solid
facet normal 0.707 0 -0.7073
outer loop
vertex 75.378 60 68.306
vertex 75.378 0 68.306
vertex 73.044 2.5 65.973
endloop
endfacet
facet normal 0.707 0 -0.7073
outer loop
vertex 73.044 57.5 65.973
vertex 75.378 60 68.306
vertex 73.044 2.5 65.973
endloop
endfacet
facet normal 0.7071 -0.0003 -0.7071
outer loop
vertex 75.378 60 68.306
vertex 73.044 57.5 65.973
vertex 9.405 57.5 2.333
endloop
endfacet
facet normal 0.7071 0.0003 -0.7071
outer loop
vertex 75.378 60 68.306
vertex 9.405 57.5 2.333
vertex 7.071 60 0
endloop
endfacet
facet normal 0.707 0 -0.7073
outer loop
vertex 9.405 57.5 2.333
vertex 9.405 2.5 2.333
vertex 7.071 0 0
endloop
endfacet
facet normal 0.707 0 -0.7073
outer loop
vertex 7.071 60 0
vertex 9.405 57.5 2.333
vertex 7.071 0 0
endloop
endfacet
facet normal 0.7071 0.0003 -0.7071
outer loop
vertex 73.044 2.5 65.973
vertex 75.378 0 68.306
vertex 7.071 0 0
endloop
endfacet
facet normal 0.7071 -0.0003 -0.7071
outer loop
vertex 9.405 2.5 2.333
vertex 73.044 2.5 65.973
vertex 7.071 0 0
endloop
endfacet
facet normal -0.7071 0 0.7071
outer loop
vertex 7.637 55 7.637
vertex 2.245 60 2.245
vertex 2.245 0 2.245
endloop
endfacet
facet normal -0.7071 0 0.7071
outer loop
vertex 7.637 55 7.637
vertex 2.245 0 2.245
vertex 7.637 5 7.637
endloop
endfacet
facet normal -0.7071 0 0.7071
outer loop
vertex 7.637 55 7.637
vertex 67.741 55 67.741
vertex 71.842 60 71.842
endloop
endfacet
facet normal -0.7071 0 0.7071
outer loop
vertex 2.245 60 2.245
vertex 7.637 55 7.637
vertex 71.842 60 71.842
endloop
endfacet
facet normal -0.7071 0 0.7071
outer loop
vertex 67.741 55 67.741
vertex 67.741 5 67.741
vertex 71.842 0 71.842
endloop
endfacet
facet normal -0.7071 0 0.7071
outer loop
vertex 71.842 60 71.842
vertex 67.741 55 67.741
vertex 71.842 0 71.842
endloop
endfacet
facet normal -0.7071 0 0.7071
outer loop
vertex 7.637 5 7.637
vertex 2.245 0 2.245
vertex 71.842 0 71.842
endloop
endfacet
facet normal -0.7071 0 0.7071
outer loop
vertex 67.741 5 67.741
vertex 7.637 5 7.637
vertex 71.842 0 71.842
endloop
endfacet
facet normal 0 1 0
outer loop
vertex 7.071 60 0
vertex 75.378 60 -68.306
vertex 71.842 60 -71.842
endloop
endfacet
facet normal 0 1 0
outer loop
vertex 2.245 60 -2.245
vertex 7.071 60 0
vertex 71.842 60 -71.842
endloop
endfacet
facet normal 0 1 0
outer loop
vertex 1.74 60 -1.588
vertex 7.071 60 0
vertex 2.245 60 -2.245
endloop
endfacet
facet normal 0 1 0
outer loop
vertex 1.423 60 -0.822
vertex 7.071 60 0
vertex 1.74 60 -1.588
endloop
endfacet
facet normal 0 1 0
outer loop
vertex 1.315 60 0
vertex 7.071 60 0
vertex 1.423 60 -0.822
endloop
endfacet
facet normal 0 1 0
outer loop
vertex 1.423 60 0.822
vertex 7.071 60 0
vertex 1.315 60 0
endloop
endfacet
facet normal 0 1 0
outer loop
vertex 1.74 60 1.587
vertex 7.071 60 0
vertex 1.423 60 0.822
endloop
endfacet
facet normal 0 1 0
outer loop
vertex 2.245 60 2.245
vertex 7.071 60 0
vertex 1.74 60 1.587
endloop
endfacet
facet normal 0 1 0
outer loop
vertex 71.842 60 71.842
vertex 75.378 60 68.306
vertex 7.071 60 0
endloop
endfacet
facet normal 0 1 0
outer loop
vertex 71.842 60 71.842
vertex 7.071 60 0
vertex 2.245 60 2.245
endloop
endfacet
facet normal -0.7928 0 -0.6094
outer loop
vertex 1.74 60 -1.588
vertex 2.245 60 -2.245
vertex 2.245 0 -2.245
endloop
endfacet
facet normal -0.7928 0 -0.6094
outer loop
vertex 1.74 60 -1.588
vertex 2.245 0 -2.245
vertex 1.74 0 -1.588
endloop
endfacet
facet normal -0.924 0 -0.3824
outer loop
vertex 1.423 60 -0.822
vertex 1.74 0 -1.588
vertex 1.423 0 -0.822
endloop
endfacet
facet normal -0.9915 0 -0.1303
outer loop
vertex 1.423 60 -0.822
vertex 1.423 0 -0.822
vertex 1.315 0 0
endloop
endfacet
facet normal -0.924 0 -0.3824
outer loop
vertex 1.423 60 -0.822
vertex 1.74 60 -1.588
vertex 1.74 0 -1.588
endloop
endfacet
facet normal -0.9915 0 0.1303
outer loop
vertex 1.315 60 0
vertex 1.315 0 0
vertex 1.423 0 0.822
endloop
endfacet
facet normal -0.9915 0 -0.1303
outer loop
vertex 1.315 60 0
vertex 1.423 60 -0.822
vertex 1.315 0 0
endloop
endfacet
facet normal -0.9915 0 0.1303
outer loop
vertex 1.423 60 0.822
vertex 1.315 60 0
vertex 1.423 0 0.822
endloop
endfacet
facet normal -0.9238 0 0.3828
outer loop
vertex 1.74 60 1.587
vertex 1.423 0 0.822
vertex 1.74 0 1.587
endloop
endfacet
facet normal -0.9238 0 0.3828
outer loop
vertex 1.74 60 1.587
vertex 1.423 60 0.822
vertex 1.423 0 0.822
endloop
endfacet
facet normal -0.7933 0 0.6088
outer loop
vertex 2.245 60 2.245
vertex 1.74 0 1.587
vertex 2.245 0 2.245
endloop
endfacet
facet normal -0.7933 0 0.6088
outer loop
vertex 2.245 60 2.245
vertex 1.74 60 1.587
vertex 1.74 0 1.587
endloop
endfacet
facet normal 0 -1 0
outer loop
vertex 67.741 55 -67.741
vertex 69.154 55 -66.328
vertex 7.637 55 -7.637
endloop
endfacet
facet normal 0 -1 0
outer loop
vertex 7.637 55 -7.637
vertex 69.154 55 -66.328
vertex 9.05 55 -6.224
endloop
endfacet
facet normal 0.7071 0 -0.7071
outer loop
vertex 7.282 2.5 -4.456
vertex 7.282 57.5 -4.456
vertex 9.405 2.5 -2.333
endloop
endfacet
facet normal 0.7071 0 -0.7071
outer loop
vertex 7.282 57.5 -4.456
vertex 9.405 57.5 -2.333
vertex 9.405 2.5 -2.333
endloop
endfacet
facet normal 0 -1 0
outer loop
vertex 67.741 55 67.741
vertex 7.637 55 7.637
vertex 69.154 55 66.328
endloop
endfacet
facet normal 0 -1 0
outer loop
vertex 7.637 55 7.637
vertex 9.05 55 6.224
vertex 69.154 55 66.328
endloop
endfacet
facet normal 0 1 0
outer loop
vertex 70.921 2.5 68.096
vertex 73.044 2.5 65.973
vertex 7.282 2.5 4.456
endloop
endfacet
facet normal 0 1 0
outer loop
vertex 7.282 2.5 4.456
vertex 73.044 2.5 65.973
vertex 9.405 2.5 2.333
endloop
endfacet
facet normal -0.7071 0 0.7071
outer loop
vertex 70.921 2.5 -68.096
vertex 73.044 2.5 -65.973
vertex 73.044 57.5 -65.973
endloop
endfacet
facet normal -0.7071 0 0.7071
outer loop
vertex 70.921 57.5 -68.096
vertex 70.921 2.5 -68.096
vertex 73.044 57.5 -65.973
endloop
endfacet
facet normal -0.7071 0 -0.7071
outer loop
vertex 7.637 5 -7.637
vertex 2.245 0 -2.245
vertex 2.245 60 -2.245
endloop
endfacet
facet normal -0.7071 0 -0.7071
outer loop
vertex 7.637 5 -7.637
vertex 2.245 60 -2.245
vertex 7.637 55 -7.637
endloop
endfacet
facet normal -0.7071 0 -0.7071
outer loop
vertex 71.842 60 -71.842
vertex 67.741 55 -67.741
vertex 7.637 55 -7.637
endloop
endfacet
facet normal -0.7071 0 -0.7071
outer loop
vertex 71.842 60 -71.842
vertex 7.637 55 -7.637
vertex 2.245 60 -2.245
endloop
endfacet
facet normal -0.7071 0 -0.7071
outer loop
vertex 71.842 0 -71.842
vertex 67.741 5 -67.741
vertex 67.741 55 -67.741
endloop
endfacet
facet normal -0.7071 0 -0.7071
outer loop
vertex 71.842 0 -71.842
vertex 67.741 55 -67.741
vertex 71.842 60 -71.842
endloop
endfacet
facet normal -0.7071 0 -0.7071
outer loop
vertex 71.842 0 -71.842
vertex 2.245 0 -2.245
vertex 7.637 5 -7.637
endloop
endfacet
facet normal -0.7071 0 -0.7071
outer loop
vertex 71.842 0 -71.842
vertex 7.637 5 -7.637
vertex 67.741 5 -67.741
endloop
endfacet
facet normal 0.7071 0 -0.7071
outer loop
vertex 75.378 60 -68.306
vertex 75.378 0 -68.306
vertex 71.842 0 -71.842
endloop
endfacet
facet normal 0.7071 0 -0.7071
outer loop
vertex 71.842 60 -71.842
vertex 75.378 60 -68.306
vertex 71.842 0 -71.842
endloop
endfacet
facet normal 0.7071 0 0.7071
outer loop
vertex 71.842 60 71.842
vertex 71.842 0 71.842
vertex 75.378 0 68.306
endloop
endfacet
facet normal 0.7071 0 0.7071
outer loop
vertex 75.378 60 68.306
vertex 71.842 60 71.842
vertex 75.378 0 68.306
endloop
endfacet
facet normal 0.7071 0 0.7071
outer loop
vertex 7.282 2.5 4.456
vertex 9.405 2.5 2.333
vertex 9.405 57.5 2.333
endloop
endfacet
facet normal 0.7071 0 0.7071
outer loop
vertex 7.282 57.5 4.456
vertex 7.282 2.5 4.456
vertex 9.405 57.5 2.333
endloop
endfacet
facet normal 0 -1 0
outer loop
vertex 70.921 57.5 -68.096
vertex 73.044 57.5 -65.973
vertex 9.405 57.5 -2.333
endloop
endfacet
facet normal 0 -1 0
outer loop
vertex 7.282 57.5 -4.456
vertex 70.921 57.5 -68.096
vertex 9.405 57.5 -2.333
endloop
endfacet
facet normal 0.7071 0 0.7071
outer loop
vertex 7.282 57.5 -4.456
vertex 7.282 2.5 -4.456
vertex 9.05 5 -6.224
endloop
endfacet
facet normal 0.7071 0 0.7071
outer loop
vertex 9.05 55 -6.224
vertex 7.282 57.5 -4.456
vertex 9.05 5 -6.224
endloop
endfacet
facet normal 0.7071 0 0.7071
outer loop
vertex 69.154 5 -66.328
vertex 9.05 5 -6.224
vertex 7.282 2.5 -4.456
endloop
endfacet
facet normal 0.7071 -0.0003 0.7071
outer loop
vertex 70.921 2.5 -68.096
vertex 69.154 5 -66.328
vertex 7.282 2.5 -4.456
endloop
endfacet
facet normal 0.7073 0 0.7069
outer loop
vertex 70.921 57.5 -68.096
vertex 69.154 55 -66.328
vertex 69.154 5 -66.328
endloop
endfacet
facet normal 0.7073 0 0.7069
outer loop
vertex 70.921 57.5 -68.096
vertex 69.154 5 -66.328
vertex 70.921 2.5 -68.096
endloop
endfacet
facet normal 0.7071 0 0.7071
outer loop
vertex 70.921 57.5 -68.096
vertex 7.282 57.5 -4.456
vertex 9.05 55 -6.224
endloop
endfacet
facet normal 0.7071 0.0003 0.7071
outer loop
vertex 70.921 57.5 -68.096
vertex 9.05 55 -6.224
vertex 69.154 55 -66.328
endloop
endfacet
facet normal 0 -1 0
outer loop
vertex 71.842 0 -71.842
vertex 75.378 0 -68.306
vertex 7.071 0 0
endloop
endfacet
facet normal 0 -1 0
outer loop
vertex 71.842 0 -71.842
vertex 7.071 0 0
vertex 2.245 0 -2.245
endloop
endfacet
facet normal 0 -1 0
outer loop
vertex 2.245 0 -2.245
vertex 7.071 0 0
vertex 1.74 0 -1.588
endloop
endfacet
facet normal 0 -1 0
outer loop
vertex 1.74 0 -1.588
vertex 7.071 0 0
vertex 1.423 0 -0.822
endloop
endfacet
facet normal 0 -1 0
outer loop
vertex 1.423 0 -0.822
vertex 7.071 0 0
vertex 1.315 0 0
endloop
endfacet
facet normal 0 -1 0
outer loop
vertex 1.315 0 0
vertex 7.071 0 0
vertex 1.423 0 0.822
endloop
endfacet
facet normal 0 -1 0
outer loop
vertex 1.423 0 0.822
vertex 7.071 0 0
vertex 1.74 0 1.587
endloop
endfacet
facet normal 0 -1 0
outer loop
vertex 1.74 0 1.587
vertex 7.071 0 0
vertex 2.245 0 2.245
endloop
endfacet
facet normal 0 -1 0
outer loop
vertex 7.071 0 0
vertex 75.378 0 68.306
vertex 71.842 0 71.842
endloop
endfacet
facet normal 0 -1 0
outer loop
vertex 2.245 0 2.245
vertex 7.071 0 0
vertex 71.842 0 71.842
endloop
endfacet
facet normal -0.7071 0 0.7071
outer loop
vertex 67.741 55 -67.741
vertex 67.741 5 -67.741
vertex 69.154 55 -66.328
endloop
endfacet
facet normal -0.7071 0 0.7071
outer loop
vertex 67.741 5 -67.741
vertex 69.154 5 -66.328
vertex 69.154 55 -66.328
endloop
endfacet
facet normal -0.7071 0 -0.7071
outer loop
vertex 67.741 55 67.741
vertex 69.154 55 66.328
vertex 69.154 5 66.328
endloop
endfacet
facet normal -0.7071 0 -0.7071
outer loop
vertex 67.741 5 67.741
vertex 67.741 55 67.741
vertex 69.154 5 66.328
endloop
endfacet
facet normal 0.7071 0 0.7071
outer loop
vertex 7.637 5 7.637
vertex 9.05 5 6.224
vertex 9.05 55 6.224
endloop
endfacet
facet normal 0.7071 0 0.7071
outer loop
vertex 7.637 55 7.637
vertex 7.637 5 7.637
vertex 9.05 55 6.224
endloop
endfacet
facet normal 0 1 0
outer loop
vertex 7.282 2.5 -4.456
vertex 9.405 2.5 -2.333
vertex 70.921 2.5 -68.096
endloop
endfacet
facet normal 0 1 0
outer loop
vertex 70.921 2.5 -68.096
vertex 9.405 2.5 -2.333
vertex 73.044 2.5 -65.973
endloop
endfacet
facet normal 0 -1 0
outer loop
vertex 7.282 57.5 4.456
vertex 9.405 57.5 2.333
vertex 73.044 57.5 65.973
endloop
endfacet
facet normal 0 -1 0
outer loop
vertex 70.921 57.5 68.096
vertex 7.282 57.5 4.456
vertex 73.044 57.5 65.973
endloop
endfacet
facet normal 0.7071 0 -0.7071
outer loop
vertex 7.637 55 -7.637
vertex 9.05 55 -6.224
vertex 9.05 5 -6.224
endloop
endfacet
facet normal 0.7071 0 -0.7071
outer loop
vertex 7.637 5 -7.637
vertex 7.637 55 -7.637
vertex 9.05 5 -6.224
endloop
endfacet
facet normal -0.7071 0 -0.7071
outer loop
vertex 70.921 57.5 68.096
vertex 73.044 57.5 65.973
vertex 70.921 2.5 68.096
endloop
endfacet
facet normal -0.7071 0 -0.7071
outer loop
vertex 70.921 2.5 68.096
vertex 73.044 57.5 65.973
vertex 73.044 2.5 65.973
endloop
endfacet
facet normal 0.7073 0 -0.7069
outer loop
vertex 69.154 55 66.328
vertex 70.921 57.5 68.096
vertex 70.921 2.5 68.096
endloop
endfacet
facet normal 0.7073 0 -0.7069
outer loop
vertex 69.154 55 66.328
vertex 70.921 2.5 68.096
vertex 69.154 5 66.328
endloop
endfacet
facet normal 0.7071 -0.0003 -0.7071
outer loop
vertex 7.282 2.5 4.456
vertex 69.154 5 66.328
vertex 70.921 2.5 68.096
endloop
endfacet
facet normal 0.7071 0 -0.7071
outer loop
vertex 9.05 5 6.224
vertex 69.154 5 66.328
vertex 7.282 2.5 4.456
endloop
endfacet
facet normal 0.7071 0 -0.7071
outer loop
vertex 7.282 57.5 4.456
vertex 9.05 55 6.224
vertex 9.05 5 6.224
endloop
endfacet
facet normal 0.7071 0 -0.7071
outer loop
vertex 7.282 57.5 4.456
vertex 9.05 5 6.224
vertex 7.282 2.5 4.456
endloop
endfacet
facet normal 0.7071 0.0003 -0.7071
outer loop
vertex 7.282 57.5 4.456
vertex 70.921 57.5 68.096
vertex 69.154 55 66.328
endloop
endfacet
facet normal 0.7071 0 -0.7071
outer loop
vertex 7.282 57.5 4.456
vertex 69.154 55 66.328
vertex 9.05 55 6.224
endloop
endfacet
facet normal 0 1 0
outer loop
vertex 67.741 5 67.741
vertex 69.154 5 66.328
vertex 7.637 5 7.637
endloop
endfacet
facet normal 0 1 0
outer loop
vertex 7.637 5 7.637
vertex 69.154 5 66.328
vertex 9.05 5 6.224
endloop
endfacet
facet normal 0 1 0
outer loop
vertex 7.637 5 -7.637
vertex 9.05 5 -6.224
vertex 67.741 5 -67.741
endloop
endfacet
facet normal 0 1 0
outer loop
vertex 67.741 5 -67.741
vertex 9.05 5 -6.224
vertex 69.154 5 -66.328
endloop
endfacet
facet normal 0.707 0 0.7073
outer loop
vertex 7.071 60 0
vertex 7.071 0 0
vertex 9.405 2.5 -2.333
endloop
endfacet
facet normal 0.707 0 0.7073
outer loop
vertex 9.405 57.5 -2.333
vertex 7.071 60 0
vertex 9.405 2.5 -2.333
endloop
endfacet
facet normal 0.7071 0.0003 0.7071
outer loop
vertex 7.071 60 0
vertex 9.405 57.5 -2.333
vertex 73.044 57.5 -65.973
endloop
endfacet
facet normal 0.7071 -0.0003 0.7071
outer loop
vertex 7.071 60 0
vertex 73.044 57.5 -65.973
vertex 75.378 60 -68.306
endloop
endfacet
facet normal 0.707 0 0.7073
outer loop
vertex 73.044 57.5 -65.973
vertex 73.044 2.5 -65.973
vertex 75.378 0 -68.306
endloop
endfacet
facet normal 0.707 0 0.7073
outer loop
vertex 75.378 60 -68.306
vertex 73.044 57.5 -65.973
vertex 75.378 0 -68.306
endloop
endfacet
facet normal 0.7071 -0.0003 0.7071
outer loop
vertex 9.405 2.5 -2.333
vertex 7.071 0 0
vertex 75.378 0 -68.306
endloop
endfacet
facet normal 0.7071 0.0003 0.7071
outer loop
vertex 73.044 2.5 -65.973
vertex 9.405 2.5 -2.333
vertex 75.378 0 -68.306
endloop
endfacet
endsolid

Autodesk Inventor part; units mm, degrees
ref_plane "YZ Plane" through (0, 0, 0) normal (1, 0, 0) x (0, 1, 0)
ref_plane "XZ Plane" through (0, 0, 0) normal (0, 1, 0) x (-1, 0, 0)
ref_plane "XY Plane" through (0, 0, 0) normal (0, 0, 1) x (1, 0, 0)
sketch "Sketch4" plane through (0, 0, 0) normal (0, 1, 0) x (-1, 0, 0)
  line L0 (0, 0) -> (-71.842, 71.842)
  line L1 (0, 0) -> (101.6, 0) construction
  line L2 (0, 0) -> (-71.842, -71.842)
  line L3 (0, 0) -> (101.6, 0) construction
  line L4 (-71.842, 71.842) -> (-75.3776, 68.3065)
  line L5 (-75.3776, 68.3065) -> (-7.0711, 0)
  line L6 (-7.0711, 0) -> (-75.3776, -68.3065)
  line L7 (-75.3776, -68.3065) -> (-71.842, -71.842)
  dimension "d20" = 101.6
  dimension "d21" = 135
  dimension "d22" = 101.6
  dimension "d23" = 135
  dimension "d24" = 5
extrude "Extrusion3" add sketch "Sketch4" along normal blind 60
sketch "Sketch5" plane through (7.0711, 0, 0) normal (0.7071, 0, -0.7071) x (-0.7071, 0, -0.7071)
  line L0 (-96.6, 0) -> (0, 0) projected
  line L1 (0, 0) -> (0, 60) projected
  line L2 (-96.6, 60) -> (0, 60) projected
  line L3 (-96.6, 0) -> (-96.6, 60) projected
  line L4 (-96.6, 0) -> (0, 0) projected
  line L5 (-96.6, 60) -> (0, 0)
  line L6 (0, 0) -> (-96.6, 0)
  line L7 (0, 60) -> (5, 60) projected
  line L8 (-96.6, 0) -> (0, 60)
  line L9 (-93.3, 2.5) -> (-3.3, 2.5)
  line L10 (-3.3, 2.5) -> (-3.3, 57.5)
  line L11 (-3.3, 57.5) -> (-93.3, 57.5)
  line L12 (-93.3, 57.5) -> (-93.3, 2.5)
  line L13 (-93.3, 2.5) -> (-3.3, 57.5) construction
  line L14 (-3.3, 2.5) -> (-93.3, 57.5) construction
  point P0 (5, 0)
  point P1 (-48.3, 30)
  dimension "d27" = 90
  dimension "d28" = 55
extrude "Extrusion4" cut sketch "Sketch5" against normal blind 3 contours L9 L12 L11 L5 L8 | L8 L5 L9 | L5 L8 L11 L10 L9 | L11 L8 L5
sketch "Sketch6" plane through (4.9497, 0, 2.1213) normal (0.7071, 0, -0.7071) x (-0.7071, 0, -0.7071)
  line L0 (-93.3, 2.5) -> (-93.3, 57.5) projected
  line L1 (-3.3, 2.5) -> (-93.3, 2.5) projected
  line L2 (-3.3, 57.5) -> (-3.3, 2.5) projected
  line L3 (-93.3, 57.5) -> (-3.3, 57.5) projected
  line L4 (-90.8, 5) -> (-5.8, 5)
  line L5 (-5.8, 5) -> (-5.8, 55)
  line L6 (-5.8, 55) -> (-90.8, 55)
  line L7 (-90.8, 55) -> (-90.8, 5)
  line L8 (-90.8, 5) -> (-5.8, 55) construction
  line L9 (-5.8, 5) -> (-90.8, 55) construction
  point P0 (5, 0)
  point P1 (-48.3, 30)
  dimension "d31" = 85
  dimension "d32" = 50
extrude "Extrusion5" cut sketch "Sketch6" against normal blind 3 contours L7 L6 L5 L4
sketch "Sketch7" plane through (75.3776, 0, -68.3065) normal (0.7071, 0, 0.7071) x (0.7071, 0, -0.7071)
  line L0 (-96.6, 0) -> (0, 0) projected
  line L1 (0, 0) -> (0, 60) projected
  line L2 (-96.6, 60) -> (0, 60) projected
  line L3 (-96.6, 0) -> (-96.6, 60) projected
  line L4 (-96.6, 0) -> (0, 60)
  line L5 (-96.6, 60) -> (0, 0)
  line L6 (-93.3, 2.5) -> (-3.3, 2.5)
  line L7 (-3.3, 2.5) -> (-3.3, 57.5)
  line L8 (-3.3, 57.5) -> (-93.3, 57.5)
  line L9 (-93.3, 57.5) -> (-93.3, 2.5)
  line L10 (-93.3, 2.5) -> (-3.3, 57.5) construction
  line L11 (-3.3, 2.5) -> (-93.3, 57.5) construction
  point P0 (-101.6, 0)
  point P1 (-48.3, 30)
  dimension "d35" = 90
  dimension "d36" = 55
extrude "Extrusion6" cut sketch "Sketch7" against normal blind 3 contours L6 L9 L8 L5 L4 | L4 L5 L6 | L5 L4 L8 L7 L6 | L8 L4 L5
sketch "Sketch8" plane through (73.2563, 0, -70.4278) normal (0.7071, 0, 0.7071) x (0.7071, 0, -0.7071)
  line L0 (-93.3, 2.5) -> (-93.3, 57.5) projected
  line L1 (-3.3, 2.5) -> (-93.3, 2.5) projected
  line L2 (-3.3, 57.5) -> (-3.3, 2.5) projected
  line L3 (-93.3, 57.5) -> (-3.3, 57.5) projected
  line L4 (-90.8, 5) -> (-5.8, 5)
  line L5 (-5.8, 5) -> (-5.8, 55)
  line L6 (-5.8, 55) -> (-90.8, 55)
  line L7 (-90.8, 55) -> (-90.8, 5)
  line L8 (-90.8, 5) -> (-5.8, 55) construction
  line L9 (-5.8, 5) -> (-90.8, 55) construction
  point P0 (-101.6, 0)
  point P1 (-48.3, 30)
  dimension "d39" = 85
  dimension "d40" = 50
extrude "Extrusion7" cut sketch "Sketch8" against normal blind 3 contours L7 L6 L5 L4
fillet "Fillet1" radius 3.175 1 edges at (0, 30, 0)
properties part number "SolarPannelMounting"
